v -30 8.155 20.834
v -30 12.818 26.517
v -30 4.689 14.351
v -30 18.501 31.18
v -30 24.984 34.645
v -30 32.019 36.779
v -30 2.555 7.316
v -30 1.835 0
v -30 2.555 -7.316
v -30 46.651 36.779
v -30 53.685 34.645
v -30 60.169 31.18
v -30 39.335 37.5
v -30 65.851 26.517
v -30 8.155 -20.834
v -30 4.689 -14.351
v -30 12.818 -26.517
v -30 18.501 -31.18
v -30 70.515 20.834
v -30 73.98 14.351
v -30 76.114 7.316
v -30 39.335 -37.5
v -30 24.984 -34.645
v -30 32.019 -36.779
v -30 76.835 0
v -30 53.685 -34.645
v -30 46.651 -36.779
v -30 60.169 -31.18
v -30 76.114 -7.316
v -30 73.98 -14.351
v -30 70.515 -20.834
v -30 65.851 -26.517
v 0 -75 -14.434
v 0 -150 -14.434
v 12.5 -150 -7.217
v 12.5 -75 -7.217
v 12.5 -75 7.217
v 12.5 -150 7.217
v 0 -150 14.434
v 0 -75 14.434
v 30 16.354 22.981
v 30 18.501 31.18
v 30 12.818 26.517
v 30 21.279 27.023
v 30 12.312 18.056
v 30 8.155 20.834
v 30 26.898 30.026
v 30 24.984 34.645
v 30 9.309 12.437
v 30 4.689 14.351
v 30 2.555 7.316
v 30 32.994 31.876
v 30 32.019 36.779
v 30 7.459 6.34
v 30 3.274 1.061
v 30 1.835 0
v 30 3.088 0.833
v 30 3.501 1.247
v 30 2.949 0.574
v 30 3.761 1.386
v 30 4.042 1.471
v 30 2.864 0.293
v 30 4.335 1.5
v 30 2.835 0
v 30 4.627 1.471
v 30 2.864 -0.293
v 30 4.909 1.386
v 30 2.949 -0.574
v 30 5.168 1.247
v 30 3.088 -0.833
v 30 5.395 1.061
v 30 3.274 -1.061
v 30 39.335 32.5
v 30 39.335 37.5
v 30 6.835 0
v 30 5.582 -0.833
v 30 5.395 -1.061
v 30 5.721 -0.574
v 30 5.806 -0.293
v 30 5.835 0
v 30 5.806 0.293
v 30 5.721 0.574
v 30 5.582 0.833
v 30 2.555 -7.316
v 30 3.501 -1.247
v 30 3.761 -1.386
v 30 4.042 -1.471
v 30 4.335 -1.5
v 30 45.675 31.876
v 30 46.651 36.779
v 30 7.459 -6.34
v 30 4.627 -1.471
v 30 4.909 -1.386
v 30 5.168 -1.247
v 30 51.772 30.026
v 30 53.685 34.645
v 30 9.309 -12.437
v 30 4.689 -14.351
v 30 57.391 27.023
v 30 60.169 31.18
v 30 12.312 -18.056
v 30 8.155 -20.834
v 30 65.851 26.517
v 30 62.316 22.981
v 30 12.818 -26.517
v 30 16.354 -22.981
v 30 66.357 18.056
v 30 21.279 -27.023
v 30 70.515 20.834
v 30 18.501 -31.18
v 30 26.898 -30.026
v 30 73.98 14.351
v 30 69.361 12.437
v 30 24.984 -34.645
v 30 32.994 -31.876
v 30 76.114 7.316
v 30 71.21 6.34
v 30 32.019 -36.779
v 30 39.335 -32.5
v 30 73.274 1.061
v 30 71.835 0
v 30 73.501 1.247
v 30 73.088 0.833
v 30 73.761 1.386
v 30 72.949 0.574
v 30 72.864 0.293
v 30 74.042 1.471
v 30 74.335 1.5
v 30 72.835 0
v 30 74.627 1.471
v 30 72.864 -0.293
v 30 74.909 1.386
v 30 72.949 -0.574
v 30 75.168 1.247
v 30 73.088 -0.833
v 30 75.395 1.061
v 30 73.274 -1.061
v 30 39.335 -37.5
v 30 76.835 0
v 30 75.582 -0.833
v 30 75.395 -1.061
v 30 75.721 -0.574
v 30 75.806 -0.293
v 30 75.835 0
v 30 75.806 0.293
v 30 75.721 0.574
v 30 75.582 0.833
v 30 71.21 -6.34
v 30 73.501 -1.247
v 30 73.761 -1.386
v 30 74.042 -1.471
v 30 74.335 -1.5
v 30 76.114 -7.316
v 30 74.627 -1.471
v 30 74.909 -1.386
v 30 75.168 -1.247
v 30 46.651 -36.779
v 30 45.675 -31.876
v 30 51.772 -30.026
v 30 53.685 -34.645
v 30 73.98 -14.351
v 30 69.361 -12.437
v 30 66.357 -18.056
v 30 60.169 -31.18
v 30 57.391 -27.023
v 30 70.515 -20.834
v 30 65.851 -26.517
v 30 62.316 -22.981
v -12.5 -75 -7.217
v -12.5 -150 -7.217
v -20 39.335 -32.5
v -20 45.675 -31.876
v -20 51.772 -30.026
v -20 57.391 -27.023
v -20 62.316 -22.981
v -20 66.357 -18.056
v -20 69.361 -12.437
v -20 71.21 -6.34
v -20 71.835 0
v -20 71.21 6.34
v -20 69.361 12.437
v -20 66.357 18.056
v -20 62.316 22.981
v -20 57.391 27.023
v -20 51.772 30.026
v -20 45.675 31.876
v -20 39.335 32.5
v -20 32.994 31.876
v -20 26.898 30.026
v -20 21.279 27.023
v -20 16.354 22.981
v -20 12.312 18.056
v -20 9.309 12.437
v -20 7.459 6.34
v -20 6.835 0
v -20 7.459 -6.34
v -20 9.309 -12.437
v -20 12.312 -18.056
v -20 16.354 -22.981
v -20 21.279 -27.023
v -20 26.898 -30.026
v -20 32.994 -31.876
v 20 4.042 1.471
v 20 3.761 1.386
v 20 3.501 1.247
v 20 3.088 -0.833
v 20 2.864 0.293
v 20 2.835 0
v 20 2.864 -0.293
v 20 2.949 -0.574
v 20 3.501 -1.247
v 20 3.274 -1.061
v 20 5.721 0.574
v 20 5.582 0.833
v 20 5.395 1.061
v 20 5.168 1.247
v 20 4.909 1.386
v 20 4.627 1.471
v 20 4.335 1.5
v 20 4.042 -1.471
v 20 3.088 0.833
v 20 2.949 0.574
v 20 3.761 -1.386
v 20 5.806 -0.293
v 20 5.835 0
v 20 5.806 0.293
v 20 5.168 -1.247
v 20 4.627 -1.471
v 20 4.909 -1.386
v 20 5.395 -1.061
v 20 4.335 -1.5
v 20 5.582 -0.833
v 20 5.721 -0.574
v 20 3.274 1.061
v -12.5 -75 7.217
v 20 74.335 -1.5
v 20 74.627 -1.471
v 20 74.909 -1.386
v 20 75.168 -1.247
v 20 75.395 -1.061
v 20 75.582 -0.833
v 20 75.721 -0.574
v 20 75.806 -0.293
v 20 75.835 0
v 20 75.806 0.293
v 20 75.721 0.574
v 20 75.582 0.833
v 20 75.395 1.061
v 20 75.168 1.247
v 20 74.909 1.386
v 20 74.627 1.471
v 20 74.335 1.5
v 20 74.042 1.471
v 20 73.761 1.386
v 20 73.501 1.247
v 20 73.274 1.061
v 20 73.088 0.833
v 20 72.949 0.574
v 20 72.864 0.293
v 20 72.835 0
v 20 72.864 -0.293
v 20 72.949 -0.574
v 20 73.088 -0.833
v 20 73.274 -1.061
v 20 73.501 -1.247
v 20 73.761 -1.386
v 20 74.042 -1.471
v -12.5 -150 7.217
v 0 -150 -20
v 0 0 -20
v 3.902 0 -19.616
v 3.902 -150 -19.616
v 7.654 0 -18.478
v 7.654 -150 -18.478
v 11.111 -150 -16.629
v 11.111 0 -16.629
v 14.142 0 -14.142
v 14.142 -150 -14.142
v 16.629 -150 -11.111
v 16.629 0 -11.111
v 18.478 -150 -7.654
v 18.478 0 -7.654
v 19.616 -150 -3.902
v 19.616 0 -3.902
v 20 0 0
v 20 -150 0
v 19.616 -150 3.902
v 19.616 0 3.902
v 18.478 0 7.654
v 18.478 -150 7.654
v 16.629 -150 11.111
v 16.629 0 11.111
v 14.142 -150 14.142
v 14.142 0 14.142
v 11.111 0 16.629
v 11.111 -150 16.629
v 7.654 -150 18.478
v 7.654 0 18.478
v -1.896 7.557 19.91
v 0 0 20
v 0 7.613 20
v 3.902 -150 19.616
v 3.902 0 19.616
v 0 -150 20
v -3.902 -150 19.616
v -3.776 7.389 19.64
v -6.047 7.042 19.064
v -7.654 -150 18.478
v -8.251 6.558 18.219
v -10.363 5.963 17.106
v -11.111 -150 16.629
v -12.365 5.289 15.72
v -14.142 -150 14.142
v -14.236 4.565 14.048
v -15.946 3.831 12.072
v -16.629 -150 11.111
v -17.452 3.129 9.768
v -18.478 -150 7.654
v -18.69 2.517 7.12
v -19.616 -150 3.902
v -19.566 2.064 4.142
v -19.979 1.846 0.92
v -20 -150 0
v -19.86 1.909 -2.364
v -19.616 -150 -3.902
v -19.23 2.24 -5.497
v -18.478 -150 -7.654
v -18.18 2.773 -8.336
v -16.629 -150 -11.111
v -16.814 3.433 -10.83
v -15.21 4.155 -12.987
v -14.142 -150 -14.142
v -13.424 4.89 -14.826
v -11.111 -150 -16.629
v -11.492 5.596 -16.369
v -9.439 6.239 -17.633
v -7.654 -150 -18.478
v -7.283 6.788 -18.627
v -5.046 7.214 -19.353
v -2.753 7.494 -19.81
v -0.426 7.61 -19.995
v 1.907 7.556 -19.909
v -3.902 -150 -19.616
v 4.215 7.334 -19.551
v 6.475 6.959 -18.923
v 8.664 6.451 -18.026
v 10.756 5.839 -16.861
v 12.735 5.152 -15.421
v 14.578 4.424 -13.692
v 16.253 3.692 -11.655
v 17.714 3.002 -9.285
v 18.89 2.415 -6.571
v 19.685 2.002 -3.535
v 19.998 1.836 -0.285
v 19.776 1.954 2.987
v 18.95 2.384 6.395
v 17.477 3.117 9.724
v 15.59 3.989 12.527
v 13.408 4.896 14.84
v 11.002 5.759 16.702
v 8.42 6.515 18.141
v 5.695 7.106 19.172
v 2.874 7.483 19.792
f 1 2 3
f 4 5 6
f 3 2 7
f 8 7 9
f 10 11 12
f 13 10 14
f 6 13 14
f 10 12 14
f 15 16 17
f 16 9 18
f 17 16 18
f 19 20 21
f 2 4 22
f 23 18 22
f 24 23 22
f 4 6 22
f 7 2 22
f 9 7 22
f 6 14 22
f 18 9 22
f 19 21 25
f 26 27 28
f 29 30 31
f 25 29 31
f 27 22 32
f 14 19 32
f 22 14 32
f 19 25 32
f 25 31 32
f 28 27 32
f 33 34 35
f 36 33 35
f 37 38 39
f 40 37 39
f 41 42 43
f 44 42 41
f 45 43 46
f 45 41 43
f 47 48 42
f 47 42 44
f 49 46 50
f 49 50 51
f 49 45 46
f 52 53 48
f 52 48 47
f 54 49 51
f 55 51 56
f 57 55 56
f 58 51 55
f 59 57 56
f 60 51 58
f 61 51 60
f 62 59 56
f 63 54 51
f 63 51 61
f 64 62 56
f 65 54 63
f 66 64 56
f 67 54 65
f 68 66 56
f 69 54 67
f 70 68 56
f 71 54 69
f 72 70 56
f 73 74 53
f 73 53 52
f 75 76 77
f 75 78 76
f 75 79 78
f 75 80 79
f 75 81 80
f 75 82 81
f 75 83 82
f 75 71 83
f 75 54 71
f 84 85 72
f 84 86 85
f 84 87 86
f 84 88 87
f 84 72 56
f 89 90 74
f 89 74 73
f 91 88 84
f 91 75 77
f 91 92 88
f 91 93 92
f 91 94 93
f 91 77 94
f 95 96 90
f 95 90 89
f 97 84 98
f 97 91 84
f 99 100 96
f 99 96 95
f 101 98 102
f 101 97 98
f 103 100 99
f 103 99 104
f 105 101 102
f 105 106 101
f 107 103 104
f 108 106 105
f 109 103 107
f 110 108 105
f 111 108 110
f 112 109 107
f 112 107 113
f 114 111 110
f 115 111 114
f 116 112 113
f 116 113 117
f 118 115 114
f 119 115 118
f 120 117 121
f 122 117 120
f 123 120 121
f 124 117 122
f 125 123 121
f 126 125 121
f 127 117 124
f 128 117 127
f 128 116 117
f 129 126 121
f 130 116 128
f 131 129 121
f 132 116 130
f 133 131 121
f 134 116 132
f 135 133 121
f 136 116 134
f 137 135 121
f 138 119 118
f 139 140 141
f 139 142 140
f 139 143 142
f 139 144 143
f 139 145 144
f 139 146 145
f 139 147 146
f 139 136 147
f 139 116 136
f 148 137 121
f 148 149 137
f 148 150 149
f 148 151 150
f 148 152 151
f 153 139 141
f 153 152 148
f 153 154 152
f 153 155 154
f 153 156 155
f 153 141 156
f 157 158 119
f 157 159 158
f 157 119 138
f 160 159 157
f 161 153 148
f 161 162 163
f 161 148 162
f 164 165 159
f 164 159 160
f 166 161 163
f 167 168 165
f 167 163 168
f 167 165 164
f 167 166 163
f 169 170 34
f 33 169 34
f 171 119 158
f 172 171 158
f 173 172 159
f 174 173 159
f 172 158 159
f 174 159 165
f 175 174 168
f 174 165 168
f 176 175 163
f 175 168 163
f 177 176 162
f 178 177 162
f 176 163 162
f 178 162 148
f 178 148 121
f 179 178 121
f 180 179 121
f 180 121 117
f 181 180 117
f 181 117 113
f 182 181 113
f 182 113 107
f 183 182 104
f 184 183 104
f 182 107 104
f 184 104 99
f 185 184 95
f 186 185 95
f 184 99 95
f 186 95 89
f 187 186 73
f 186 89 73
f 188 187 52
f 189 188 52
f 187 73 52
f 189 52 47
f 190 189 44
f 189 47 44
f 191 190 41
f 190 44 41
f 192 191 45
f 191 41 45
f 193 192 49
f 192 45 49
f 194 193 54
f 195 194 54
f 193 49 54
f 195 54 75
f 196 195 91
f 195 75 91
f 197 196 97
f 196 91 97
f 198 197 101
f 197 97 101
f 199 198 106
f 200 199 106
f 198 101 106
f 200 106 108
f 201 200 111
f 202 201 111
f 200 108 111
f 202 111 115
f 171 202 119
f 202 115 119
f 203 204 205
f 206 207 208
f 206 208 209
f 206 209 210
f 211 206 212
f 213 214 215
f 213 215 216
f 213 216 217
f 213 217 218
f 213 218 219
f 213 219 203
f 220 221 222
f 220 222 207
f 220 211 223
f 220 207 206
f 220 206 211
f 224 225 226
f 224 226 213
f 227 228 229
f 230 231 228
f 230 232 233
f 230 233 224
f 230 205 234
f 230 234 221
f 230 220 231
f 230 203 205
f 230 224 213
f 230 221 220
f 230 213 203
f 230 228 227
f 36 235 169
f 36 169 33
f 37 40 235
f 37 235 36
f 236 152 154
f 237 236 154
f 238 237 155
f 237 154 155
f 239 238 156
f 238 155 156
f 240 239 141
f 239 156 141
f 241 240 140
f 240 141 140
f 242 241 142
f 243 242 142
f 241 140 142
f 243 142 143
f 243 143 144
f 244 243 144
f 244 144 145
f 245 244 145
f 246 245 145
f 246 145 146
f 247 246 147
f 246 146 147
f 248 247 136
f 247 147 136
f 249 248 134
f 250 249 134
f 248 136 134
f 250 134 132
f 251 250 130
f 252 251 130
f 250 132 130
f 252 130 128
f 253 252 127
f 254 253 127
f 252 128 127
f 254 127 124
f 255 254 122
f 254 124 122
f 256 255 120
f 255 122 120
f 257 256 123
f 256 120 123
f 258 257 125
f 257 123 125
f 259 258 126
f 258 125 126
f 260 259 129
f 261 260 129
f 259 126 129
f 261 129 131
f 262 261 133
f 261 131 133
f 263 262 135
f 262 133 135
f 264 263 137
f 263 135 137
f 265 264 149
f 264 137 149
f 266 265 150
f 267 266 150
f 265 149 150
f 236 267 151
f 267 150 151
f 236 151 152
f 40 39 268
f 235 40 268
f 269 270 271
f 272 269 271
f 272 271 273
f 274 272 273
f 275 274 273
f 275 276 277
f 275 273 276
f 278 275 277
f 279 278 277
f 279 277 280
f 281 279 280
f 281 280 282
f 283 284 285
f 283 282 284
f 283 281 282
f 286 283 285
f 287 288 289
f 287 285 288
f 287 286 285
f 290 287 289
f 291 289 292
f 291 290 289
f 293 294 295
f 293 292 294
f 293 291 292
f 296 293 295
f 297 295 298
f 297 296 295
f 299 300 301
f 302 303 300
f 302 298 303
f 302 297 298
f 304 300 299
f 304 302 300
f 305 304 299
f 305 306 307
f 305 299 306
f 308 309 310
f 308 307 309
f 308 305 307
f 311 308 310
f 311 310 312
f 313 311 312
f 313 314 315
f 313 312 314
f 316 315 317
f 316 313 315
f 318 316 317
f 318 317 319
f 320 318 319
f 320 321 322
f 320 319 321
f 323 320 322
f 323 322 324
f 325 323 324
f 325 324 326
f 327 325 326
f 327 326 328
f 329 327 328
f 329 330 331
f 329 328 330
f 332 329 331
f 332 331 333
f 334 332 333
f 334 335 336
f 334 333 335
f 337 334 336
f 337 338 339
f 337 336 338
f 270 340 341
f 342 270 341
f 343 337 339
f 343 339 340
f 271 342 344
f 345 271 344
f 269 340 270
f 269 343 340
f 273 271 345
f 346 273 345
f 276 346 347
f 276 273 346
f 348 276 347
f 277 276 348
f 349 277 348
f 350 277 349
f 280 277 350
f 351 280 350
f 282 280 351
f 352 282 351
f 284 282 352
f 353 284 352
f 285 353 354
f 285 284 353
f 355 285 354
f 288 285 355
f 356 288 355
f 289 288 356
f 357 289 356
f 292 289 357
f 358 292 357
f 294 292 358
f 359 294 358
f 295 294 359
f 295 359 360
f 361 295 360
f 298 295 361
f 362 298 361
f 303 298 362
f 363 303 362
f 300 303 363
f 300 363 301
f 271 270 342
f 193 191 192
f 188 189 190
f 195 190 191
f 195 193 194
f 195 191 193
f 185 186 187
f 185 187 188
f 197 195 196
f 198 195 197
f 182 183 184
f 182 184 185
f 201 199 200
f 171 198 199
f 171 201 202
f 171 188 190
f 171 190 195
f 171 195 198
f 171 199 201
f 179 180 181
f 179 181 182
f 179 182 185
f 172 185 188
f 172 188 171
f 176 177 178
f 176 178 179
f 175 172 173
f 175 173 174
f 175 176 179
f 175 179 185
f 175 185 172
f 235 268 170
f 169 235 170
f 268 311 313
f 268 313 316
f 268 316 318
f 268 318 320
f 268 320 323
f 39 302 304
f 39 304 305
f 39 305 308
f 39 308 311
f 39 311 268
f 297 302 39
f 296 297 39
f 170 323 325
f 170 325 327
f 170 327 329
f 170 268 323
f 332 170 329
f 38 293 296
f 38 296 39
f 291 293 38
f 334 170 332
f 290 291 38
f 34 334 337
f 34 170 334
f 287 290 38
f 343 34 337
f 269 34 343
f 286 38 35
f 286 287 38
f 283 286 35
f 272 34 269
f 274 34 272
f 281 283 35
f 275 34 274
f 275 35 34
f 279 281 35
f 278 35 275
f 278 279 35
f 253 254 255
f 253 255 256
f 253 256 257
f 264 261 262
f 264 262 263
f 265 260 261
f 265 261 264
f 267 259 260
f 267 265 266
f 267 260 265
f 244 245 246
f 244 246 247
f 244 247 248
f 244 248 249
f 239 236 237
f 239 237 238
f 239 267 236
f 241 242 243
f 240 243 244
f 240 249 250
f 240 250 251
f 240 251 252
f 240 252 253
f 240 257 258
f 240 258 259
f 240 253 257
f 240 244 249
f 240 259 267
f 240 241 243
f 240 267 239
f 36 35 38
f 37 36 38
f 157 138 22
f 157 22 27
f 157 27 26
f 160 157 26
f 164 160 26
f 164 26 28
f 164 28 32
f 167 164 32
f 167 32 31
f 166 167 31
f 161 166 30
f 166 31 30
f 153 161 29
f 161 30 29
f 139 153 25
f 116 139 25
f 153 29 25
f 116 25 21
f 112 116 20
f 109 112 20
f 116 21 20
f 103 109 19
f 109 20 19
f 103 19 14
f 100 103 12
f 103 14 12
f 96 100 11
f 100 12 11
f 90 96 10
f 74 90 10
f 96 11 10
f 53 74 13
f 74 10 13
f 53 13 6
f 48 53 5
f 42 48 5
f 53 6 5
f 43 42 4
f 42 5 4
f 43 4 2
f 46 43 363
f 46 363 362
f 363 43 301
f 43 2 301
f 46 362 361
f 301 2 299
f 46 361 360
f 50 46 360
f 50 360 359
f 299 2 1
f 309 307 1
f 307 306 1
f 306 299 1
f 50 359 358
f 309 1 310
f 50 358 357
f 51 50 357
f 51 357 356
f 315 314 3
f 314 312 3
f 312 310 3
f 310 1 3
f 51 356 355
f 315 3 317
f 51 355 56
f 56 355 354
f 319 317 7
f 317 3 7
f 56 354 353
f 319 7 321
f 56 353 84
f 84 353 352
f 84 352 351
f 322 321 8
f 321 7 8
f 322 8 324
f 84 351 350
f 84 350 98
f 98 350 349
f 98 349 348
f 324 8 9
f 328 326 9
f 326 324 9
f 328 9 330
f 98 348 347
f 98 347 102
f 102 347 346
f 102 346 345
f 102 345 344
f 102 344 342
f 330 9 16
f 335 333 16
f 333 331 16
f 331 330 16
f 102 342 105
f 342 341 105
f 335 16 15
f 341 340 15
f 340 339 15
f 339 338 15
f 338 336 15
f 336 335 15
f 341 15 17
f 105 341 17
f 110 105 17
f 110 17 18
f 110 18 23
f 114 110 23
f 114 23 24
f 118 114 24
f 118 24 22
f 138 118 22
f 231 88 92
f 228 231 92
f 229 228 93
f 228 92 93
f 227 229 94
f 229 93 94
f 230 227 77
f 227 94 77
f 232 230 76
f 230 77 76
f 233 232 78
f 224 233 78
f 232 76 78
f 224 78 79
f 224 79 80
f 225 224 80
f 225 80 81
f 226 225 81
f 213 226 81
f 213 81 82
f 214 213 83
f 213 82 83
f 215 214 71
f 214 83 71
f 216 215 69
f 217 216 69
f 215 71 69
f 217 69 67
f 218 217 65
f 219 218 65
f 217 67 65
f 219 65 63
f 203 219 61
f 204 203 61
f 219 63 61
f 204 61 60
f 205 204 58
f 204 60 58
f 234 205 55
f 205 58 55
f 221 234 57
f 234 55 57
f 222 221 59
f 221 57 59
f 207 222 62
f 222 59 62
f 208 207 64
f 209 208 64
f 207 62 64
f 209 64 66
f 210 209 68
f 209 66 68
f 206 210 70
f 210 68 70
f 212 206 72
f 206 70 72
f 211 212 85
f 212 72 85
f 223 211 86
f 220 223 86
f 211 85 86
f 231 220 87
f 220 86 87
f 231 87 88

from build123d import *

# Parameters (mm, degrees)
SKETCH1_R                 = 20
BOSS_EXTRUDE1_DEPTH       = 25
BOSS_EXTRUDE2_START       = 100
SKETCH2_R                 = 20
BOSS_EXTRUDE2_DEPTH       = 100
BOSS_EXTRUDE4_START       = -100
SKETCH6_R                 = 20
BOSS_EXTRUDE4_DEPTH       = 100
SKETCH7_R                 = 25
CUT_EXTRUDE2_DEPTH        = 40
SKETCH8_R                 = 25
SKETCH8_R_2               = 22.5
BOSS_EXTRUDE7_DEPTH       = 40
SKETCH9_R                 = 25
BOSS_EXTRUDE8_DEPTH       = 2
BOSS_EXTRUDE10_DEPTH      = 38
CUT_EXTRUDE3_DEPTH        = 25
SKETCH12_R                = 25
CUT_EXTRUDE4_DEPTH        = 75
BOSS_EXTRUDE11_START      = 50
SKETCH14_R                = 20
BOSS_EXTRUDE11_DEPTH      = 50
BOSS_EXTRUDE12_DEPTH      = 10
BOSS_EXTRUDE12_DEPTH_BACK = 50
SKETCH13_R                = 37.5
SKETCH17_R                = 32.5
CUT_EXTRUDE5_DEPTH        = 50
BOSS_EXTRUDE13_START      = 2
SKETCH18_R                = 37.5
SKETCH18_R_2              = 32.5
BOSS_EXTRUDE13_DEPTH      = 2
SKETCH21_R                = 37.5
SKETCH21_R_2              = 32.5
CUT_EXTRUDE6_DEPTH        = 2
SKETCH22_R                = 1.5
CUT_EXTRUDE7_DEPTH        = 10


with BuildPart() as part:
    # Sketch1 → Boss-Extrude1 (new body)
    with BuildSketch(Plane(origin=(0, 0, 0), x_dir=(1, 0, 0), z_dir=(0, 1, 0))):
        with Locations(Location((0, 0, 0), (0, 0, 270))):
            Circle(SKETCH1_R)
        Polygon((14.43375673, 0), (7.216878365, 12.5), (-7.216878365, 12.5), (-14.43375673, 0), (-7.216878365, -12.5), (7.216878365, -12.5), align=None, mode=Mode.SUBTRACT)
    extrude(amount=BOSS_EXTRUDE1_DEPTH)

    # Sketch2 → Boss-Extrude2 (add)
    with BuildSketch(Plane.XZ.offset(BOSS_EXTRUDE2_START)):
        with Locations(Location((0, 0, 0), (0, 0, 270))):
            Circle(SKETCH2_R)
    extrude(amount=-BOSS_EXTRUDE2_DEPTH)

    # Sketch6 → Boss-Extrude4 (add)
    with BuildSketch(Plane(origin=(0, 25, 0), x_dir=(1, 0, 0), z_dir=(0, 1, 0)).offset(BOSS_EXTRUDE4_START)):
        with Locations(Location((0, 0, 0), (0, 0, 90))):
            Circle(SKETCH6_R)
    extrude(amount=BOSS_EXTRUDE4_DEPTH)

    # Sketch7 → Cut-Extrude2 (cut)
    with BuildSketch(Plane(origin=(20, 0, 0), x_dir=(0, 0, -1), z_dir=(1, 0, 0))):
        with Locations((0, 39.286563349)):
            Circle(SKETCH7_R)
    extrude(amount=-CUT_EXTRUDE2_DEPTH, mode=Mode.SUBTRACT)

    # Sketch8 → Boss-Extrude7 (add)
    with BuildSketch(Plane(origin=(20, 0, 0), x_dir=(0, 0, -1), z_dir=(1, 0, 0))):
        with Locations((0, 39.252781264)):
            Circle(SKETCH8_R)
        with Locations((0, 39.252781264)):
            Circle(SKETCH8_R_2, mode=Mode.SUBTRACT)
    extrude(amount=-BOSS_EXTRUDE7_DEPTH)

    # Sketch9 → Boss-Extrude8 (add)
    with BuildSketch(Plane(origin=(20, 0, 0), x_dir=(0, 0, -1), z_dir=(1, 0, 0))):
        with Locations((0, 39.252781264)):
            Circle(SKETCH9_R)
    extrude(amount=-BOSS_EXTRUDE8_DEPTH)

    # Sketch10 → Boss-Extrude10 (add)
    with BuildSketch(Plane.ZY.offset(-18)):
        with BuildLine():
            Line((-15.081099266, 22.555163323), (15.081099266, 22.555163323))
            ThreePointArc((15.081099266, 22.555163323), (0, 16.752781264), (-15.081099266, 22.555163323))
        make_face()
    extrude(amount=BOSS_EXTRUDE10_DEPTH)

    # Sketch11 → Cut-Extrude3 (cut)
    with BuildSketch(Plane.XZ.offset(100)):
        Polygon((12.5, 7.216878365), (0, 14.43375673), (0, 0), (12.5, 0), align=None)
        Polygon((0, 0), (0, 14.43375673), (-12.5, 7.216878365), (-12.5, -7.216878365), (0, -14.43375673), (12.5, -7.216878365), (12.5, 0), align=None)
    extrude(amount=-CUT_EXTRUDE3_DEPTH, mode=Mode.SUBTRACT)

    # Sketch12 → Cut-Extrude4 (cut)
    with BuildSketch(Plane(origin=(20, 0, 0), x_dir=(0, 0, -1), z_dir=(1, 0, 0))):
        with Locations((0, 39.252781264)):
            Circle(SKETCH12_R)
    extrude(amount=-CUT_EXTRUDE4_DEPTH, mode=Mode.SUBTRACT)

    # Sketch14 → Boss-Extrude11 (add)
    with BuildSketch(Plane.XZ.offset(100).offset(BOSS_EXTRUDE11_START)):
        with Locations(Location((0, 0, 0), (0, 0, 270))):
            Circle(SKETCH14_R)
        Polygon((0, -14.43375673), (12.5, -7.216878365), (12.5, 7.216878365), (0, 14.43375673), (-12.5, 7.216878365), (-12.5, -7.216878365), align=None, mode=Mode.SUBTRACT)
    extrude(amount=-BOSS_EXTRUDE11_DEPTH)

    # Sketch13 → Boss-Extrude12 (add, two sides: drawn at the far end of the back side and taken through both)
    with BuildSketch(Plane(origin=(20, 0, 0), x_dir=(0, 0, -1), z_dir=(1, 0, 0)).offset(-BOSS_EXTRUDE12_DEPTH_BACK)):
        with Locations((0, 39.33472939)):
            Circle(SKETCH13_R)
    extrude(amount=BOSS_EXTRUDE12_DEPTH + BOSS_EXTRUDE12_DEPTH_BACK)

    # Sketch17 → Cut-Extrude5 (cut)
    with BuildSketch(Plane(origin=(30, 0, 0), x_dir=(0, 0, -1), z_dir=(1, 0, 0))):
        with Locations((0, 39.33472939)):
            Circle(SKETCH17_R)
    extrude(amount=-CUT_EXTRUDE5_DEPTH, mode=Mode.SUBTRACT)

    # Sketch18 → Boss-Extrude13 (add)
    with BuildSketch(Plane(origin=(30, 0, 0), x_dir=(0, 0, -1), z_dir=(1, 0, 0)).offset(BOSS_EXTRUDE13_START)):
        with Locations((0, 39.33472939)):
            Circle(SKETCH18_R)
        with Locations((0, 39.33472939)):
            Circle(SKETCH18_R_2, mode=Mode.SUBTRACT)
    extrude(amount=-BOSS_EXTRUDE13_DEPTH)

    # Sketch21 → Cut-Extrude6 (cut)
    with BuildSketch(Plane(origin=(32, 0, 0), x_dir=(0, 0, -1), z_dir=(1, 0, 0))):
        with Locations((0, 39.33472939)):
            Circle(SKETCH21_R)
        with Locations((0, 39.33472939)):
            Circle(SKETCH21_R_2, mode=Mode.SUBTRACT)
    extrude(amount=-CUT_EXTRUDE6_DEPTH, mode=Mode.SUBTRACT)

    # Sketch22 → Cut-Extrude7 (cut)
    with BuildSketch(Plane(origin=(30, 0, 0), x_dir=(0, 0, -1), z_dir=(1, 0, 0))):
        with Locations((0, 74.33472939)):
            Circle(SKETCH22_R)
        with Locations((0, 4.33472939)):
            Circle(SKETCH22_R)
    extrude(amount=-CUT_EXTRUDE7_DEPTH, mode=Mode.SUBTRACT)


solid = part.part
